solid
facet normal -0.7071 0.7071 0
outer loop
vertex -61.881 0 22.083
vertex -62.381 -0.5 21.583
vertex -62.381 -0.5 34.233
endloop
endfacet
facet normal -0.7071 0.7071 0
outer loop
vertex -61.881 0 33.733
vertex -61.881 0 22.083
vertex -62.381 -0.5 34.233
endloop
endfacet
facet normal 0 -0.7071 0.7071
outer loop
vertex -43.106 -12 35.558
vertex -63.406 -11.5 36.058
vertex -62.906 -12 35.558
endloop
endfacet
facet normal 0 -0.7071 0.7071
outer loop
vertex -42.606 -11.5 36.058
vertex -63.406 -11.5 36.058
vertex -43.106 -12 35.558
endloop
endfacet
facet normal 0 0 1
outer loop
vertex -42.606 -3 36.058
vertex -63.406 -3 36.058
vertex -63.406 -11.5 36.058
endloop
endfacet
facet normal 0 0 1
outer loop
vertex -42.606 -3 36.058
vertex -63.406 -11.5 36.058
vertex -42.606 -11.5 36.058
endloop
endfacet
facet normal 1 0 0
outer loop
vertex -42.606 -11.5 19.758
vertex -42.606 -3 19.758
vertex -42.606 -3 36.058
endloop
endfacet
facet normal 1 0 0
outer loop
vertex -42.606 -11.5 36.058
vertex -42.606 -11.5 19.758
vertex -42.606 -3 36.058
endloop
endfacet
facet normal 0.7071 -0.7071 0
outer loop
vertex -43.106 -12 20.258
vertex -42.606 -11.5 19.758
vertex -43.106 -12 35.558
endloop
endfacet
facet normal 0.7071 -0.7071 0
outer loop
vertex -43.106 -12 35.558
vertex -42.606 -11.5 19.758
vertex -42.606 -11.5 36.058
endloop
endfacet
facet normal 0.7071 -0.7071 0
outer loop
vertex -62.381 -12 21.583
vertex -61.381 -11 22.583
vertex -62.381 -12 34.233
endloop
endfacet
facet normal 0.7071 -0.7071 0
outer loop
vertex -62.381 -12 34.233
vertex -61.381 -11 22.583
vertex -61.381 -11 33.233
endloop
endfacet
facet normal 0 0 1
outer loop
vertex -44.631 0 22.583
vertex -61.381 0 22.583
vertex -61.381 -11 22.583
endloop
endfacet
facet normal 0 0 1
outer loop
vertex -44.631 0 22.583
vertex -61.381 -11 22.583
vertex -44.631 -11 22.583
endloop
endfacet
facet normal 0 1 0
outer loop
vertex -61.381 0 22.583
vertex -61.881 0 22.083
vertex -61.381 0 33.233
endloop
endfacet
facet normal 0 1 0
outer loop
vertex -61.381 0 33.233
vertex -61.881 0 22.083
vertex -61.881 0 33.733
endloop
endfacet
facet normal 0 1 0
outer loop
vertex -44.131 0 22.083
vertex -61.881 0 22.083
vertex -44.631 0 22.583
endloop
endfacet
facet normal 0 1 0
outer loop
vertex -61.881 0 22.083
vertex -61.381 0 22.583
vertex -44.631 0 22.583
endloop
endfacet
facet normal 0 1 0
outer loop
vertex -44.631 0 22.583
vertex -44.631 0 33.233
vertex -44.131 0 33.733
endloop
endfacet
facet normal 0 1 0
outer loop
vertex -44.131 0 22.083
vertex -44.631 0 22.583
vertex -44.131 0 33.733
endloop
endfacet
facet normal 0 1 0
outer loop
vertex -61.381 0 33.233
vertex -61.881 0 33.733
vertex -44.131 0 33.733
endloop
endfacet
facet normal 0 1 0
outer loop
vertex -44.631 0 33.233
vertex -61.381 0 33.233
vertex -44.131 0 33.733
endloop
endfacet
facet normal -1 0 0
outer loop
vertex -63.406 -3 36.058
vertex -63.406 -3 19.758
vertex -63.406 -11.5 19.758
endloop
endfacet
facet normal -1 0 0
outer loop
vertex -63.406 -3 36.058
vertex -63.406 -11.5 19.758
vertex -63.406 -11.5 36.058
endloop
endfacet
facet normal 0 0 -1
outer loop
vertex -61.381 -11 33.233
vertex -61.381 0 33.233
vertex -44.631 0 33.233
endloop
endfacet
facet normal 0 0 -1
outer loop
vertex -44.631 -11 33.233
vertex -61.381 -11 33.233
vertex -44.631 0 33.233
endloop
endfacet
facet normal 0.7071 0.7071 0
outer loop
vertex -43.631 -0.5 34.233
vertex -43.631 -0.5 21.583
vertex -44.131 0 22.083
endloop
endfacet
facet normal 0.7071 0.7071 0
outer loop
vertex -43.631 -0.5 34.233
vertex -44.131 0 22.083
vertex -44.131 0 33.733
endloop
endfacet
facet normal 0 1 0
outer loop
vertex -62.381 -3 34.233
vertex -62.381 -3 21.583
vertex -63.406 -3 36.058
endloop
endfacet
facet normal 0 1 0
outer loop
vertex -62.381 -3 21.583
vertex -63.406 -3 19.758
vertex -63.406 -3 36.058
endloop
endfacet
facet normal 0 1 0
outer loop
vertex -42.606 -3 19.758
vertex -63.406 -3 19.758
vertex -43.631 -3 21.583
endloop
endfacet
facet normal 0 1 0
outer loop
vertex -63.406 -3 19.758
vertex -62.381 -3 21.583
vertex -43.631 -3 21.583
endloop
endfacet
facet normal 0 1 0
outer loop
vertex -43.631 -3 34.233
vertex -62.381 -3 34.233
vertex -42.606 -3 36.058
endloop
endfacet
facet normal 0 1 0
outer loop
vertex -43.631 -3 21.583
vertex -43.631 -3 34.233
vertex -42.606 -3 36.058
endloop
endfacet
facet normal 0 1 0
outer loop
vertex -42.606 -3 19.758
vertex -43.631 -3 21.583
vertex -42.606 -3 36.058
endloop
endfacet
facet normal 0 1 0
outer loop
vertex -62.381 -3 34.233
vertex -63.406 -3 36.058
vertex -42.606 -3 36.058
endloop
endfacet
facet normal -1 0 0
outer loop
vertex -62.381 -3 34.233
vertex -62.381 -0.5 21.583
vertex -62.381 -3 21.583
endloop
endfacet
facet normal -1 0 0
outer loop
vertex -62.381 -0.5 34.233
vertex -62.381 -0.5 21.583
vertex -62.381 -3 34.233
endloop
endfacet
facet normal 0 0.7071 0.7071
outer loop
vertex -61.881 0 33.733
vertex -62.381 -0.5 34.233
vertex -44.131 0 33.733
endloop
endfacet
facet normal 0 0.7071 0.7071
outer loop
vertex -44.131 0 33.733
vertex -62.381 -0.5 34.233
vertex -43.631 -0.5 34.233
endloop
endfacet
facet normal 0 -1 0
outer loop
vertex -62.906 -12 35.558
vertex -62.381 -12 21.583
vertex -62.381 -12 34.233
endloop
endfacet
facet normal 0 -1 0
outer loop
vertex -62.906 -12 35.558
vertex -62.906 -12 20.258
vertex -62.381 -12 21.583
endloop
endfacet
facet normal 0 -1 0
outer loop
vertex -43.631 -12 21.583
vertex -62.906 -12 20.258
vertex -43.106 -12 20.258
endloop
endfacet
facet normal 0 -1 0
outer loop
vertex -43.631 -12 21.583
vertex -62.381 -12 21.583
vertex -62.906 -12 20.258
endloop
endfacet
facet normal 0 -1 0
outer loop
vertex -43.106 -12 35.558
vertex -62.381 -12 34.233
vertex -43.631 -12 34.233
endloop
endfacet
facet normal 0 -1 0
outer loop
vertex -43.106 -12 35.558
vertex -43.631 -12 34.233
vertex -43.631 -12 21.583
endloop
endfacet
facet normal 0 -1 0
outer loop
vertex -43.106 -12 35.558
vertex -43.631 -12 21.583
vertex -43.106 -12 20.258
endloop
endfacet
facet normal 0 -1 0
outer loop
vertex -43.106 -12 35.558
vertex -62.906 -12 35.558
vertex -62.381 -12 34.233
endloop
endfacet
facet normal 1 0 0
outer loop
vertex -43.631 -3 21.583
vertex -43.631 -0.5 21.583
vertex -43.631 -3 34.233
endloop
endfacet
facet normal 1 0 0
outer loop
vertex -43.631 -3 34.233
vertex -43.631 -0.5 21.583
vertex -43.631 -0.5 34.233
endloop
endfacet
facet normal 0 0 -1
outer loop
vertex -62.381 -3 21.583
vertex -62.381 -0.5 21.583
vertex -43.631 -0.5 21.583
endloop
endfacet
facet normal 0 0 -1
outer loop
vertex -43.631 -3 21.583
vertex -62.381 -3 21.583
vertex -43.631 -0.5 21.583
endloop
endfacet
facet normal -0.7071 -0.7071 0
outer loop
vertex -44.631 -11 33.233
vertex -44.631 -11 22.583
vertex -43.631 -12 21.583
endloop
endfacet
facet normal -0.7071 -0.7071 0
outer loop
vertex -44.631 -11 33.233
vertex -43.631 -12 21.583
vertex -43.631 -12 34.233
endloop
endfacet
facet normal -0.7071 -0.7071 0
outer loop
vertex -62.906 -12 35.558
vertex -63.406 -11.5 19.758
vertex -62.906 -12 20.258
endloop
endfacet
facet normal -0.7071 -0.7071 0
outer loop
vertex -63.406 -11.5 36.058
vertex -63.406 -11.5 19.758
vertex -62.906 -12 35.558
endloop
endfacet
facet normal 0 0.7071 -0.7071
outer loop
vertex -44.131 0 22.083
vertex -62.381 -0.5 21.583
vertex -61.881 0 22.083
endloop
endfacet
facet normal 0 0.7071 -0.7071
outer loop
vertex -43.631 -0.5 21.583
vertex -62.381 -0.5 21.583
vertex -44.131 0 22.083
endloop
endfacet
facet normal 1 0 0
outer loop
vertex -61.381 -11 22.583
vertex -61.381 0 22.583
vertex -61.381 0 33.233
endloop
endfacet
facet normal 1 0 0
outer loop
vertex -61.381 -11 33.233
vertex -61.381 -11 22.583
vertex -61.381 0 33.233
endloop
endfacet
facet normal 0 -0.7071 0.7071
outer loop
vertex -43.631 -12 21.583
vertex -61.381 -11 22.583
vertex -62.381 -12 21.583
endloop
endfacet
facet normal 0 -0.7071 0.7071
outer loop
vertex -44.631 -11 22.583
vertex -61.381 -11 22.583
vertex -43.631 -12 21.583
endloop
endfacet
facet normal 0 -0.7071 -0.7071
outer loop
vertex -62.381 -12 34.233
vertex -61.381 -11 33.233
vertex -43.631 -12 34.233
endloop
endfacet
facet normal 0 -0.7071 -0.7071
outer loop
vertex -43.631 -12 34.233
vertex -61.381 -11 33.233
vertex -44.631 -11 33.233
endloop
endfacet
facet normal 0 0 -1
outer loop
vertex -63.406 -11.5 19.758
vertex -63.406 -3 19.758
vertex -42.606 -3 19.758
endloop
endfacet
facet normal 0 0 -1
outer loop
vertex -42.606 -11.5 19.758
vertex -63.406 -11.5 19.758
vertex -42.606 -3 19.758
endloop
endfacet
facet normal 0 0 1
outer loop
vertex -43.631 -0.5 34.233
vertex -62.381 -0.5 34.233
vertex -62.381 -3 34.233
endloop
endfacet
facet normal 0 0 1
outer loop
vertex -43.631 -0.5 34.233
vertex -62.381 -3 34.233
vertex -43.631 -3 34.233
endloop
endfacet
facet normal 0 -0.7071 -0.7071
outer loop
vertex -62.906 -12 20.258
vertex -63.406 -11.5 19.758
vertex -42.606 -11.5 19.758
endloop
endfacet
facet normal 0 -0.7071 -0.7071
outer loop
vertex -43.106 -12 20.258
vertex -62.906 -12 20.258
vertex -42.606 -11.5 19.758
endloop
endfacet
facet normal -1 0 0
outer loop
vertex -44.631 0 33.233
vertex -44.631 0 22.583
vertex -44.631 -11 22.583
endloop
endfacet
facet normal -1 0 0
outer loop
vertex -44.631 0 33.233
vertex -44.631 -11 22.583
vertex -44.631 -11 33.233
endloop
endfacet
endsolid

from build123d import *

# Parameters (mm, degrees)
F0_W     = 18.75
F0_H     = 12.65
F0_W_2   = 16.75
F0_H_2   = 10.65
F1_DEPTH = 3
F2_W     = 20.8
F2_H     = 16.3
F2_W_2   = 18.75
F2_H_2   = 12.65
F2_W_3   = 16.75
F2_H_3   = 10.65
F3_DEPTH = 9
F4_SIZE  = 1
F5_SIZE  = 0.5


with BuildPart() as f1:
    # F0 (on Front) → F1 (new body)
    with BuildSketch(Plane.XZ):
        with Locations((-53.0061718459, 27.9083168134)):
            Rectangle(F0_W, F0_H)
        with Locations((-53.0061718459, 27.9083168134)):
            Rectangle(F0_W_2, F0_H_2, mode=Mode.SUBTRACT)
    extrude(amount=F1_DEPTH)

    # F2 (on face) → F3 (join)
    with BuildSketch(Plane.XZ.offset(3)):
        with Locations((-53.0061718459, 27.9083168134)):
            Rectangle(F2_W, F2_H)
        with Locations((-53.0061718459, 27.9083168134)):
            Rectangle(F2_W_2, F2_H_2, mode=Mode.SUBTRACT)
        with Locations((-53.0061718459, 27.9083168134)):
            Rectangle(F2_W_2, F2_H_2)
        with Locations((-53.0061718459, 27.9083168134)):
            Rectangle(F2_W_3, F2_H_3, mode=Mode.SUBTRACT)
    extrude(amount=F3_DEPTH)

    # F4
    f4_edges = [f1.edges().sort_by_distance(p)[0] for p in [
        (-53.006172, -12, 33.233317),
        (-44.631172, -12, 27.908317),
        (-53.006172, -12, 22.583317),
        (-61.381172, -12, 27.908317),
    ]]
    chamfer(f4_edges, length=F4_SIZE)

    # F5
    f5_edges = [f1.edges().sort_by_distance(p)[0] for p in [
        (-53.006172, 0, 34.233317),
        (-62.381172, 0, 27.908317),
        (-53.006172, 0, 21.583317),
        (-43.631172, 0, 27.908317),
        (-53.006172, -12, 36.058317),
        (-63.406172, -12, 27.908317),
        (-53.006172, -12, 19.758317),
        (-42.606172, -12, 27.908317),
    ]]
    chamfer(f5_edges, length=F5_SIZE)


solid = f1.part
